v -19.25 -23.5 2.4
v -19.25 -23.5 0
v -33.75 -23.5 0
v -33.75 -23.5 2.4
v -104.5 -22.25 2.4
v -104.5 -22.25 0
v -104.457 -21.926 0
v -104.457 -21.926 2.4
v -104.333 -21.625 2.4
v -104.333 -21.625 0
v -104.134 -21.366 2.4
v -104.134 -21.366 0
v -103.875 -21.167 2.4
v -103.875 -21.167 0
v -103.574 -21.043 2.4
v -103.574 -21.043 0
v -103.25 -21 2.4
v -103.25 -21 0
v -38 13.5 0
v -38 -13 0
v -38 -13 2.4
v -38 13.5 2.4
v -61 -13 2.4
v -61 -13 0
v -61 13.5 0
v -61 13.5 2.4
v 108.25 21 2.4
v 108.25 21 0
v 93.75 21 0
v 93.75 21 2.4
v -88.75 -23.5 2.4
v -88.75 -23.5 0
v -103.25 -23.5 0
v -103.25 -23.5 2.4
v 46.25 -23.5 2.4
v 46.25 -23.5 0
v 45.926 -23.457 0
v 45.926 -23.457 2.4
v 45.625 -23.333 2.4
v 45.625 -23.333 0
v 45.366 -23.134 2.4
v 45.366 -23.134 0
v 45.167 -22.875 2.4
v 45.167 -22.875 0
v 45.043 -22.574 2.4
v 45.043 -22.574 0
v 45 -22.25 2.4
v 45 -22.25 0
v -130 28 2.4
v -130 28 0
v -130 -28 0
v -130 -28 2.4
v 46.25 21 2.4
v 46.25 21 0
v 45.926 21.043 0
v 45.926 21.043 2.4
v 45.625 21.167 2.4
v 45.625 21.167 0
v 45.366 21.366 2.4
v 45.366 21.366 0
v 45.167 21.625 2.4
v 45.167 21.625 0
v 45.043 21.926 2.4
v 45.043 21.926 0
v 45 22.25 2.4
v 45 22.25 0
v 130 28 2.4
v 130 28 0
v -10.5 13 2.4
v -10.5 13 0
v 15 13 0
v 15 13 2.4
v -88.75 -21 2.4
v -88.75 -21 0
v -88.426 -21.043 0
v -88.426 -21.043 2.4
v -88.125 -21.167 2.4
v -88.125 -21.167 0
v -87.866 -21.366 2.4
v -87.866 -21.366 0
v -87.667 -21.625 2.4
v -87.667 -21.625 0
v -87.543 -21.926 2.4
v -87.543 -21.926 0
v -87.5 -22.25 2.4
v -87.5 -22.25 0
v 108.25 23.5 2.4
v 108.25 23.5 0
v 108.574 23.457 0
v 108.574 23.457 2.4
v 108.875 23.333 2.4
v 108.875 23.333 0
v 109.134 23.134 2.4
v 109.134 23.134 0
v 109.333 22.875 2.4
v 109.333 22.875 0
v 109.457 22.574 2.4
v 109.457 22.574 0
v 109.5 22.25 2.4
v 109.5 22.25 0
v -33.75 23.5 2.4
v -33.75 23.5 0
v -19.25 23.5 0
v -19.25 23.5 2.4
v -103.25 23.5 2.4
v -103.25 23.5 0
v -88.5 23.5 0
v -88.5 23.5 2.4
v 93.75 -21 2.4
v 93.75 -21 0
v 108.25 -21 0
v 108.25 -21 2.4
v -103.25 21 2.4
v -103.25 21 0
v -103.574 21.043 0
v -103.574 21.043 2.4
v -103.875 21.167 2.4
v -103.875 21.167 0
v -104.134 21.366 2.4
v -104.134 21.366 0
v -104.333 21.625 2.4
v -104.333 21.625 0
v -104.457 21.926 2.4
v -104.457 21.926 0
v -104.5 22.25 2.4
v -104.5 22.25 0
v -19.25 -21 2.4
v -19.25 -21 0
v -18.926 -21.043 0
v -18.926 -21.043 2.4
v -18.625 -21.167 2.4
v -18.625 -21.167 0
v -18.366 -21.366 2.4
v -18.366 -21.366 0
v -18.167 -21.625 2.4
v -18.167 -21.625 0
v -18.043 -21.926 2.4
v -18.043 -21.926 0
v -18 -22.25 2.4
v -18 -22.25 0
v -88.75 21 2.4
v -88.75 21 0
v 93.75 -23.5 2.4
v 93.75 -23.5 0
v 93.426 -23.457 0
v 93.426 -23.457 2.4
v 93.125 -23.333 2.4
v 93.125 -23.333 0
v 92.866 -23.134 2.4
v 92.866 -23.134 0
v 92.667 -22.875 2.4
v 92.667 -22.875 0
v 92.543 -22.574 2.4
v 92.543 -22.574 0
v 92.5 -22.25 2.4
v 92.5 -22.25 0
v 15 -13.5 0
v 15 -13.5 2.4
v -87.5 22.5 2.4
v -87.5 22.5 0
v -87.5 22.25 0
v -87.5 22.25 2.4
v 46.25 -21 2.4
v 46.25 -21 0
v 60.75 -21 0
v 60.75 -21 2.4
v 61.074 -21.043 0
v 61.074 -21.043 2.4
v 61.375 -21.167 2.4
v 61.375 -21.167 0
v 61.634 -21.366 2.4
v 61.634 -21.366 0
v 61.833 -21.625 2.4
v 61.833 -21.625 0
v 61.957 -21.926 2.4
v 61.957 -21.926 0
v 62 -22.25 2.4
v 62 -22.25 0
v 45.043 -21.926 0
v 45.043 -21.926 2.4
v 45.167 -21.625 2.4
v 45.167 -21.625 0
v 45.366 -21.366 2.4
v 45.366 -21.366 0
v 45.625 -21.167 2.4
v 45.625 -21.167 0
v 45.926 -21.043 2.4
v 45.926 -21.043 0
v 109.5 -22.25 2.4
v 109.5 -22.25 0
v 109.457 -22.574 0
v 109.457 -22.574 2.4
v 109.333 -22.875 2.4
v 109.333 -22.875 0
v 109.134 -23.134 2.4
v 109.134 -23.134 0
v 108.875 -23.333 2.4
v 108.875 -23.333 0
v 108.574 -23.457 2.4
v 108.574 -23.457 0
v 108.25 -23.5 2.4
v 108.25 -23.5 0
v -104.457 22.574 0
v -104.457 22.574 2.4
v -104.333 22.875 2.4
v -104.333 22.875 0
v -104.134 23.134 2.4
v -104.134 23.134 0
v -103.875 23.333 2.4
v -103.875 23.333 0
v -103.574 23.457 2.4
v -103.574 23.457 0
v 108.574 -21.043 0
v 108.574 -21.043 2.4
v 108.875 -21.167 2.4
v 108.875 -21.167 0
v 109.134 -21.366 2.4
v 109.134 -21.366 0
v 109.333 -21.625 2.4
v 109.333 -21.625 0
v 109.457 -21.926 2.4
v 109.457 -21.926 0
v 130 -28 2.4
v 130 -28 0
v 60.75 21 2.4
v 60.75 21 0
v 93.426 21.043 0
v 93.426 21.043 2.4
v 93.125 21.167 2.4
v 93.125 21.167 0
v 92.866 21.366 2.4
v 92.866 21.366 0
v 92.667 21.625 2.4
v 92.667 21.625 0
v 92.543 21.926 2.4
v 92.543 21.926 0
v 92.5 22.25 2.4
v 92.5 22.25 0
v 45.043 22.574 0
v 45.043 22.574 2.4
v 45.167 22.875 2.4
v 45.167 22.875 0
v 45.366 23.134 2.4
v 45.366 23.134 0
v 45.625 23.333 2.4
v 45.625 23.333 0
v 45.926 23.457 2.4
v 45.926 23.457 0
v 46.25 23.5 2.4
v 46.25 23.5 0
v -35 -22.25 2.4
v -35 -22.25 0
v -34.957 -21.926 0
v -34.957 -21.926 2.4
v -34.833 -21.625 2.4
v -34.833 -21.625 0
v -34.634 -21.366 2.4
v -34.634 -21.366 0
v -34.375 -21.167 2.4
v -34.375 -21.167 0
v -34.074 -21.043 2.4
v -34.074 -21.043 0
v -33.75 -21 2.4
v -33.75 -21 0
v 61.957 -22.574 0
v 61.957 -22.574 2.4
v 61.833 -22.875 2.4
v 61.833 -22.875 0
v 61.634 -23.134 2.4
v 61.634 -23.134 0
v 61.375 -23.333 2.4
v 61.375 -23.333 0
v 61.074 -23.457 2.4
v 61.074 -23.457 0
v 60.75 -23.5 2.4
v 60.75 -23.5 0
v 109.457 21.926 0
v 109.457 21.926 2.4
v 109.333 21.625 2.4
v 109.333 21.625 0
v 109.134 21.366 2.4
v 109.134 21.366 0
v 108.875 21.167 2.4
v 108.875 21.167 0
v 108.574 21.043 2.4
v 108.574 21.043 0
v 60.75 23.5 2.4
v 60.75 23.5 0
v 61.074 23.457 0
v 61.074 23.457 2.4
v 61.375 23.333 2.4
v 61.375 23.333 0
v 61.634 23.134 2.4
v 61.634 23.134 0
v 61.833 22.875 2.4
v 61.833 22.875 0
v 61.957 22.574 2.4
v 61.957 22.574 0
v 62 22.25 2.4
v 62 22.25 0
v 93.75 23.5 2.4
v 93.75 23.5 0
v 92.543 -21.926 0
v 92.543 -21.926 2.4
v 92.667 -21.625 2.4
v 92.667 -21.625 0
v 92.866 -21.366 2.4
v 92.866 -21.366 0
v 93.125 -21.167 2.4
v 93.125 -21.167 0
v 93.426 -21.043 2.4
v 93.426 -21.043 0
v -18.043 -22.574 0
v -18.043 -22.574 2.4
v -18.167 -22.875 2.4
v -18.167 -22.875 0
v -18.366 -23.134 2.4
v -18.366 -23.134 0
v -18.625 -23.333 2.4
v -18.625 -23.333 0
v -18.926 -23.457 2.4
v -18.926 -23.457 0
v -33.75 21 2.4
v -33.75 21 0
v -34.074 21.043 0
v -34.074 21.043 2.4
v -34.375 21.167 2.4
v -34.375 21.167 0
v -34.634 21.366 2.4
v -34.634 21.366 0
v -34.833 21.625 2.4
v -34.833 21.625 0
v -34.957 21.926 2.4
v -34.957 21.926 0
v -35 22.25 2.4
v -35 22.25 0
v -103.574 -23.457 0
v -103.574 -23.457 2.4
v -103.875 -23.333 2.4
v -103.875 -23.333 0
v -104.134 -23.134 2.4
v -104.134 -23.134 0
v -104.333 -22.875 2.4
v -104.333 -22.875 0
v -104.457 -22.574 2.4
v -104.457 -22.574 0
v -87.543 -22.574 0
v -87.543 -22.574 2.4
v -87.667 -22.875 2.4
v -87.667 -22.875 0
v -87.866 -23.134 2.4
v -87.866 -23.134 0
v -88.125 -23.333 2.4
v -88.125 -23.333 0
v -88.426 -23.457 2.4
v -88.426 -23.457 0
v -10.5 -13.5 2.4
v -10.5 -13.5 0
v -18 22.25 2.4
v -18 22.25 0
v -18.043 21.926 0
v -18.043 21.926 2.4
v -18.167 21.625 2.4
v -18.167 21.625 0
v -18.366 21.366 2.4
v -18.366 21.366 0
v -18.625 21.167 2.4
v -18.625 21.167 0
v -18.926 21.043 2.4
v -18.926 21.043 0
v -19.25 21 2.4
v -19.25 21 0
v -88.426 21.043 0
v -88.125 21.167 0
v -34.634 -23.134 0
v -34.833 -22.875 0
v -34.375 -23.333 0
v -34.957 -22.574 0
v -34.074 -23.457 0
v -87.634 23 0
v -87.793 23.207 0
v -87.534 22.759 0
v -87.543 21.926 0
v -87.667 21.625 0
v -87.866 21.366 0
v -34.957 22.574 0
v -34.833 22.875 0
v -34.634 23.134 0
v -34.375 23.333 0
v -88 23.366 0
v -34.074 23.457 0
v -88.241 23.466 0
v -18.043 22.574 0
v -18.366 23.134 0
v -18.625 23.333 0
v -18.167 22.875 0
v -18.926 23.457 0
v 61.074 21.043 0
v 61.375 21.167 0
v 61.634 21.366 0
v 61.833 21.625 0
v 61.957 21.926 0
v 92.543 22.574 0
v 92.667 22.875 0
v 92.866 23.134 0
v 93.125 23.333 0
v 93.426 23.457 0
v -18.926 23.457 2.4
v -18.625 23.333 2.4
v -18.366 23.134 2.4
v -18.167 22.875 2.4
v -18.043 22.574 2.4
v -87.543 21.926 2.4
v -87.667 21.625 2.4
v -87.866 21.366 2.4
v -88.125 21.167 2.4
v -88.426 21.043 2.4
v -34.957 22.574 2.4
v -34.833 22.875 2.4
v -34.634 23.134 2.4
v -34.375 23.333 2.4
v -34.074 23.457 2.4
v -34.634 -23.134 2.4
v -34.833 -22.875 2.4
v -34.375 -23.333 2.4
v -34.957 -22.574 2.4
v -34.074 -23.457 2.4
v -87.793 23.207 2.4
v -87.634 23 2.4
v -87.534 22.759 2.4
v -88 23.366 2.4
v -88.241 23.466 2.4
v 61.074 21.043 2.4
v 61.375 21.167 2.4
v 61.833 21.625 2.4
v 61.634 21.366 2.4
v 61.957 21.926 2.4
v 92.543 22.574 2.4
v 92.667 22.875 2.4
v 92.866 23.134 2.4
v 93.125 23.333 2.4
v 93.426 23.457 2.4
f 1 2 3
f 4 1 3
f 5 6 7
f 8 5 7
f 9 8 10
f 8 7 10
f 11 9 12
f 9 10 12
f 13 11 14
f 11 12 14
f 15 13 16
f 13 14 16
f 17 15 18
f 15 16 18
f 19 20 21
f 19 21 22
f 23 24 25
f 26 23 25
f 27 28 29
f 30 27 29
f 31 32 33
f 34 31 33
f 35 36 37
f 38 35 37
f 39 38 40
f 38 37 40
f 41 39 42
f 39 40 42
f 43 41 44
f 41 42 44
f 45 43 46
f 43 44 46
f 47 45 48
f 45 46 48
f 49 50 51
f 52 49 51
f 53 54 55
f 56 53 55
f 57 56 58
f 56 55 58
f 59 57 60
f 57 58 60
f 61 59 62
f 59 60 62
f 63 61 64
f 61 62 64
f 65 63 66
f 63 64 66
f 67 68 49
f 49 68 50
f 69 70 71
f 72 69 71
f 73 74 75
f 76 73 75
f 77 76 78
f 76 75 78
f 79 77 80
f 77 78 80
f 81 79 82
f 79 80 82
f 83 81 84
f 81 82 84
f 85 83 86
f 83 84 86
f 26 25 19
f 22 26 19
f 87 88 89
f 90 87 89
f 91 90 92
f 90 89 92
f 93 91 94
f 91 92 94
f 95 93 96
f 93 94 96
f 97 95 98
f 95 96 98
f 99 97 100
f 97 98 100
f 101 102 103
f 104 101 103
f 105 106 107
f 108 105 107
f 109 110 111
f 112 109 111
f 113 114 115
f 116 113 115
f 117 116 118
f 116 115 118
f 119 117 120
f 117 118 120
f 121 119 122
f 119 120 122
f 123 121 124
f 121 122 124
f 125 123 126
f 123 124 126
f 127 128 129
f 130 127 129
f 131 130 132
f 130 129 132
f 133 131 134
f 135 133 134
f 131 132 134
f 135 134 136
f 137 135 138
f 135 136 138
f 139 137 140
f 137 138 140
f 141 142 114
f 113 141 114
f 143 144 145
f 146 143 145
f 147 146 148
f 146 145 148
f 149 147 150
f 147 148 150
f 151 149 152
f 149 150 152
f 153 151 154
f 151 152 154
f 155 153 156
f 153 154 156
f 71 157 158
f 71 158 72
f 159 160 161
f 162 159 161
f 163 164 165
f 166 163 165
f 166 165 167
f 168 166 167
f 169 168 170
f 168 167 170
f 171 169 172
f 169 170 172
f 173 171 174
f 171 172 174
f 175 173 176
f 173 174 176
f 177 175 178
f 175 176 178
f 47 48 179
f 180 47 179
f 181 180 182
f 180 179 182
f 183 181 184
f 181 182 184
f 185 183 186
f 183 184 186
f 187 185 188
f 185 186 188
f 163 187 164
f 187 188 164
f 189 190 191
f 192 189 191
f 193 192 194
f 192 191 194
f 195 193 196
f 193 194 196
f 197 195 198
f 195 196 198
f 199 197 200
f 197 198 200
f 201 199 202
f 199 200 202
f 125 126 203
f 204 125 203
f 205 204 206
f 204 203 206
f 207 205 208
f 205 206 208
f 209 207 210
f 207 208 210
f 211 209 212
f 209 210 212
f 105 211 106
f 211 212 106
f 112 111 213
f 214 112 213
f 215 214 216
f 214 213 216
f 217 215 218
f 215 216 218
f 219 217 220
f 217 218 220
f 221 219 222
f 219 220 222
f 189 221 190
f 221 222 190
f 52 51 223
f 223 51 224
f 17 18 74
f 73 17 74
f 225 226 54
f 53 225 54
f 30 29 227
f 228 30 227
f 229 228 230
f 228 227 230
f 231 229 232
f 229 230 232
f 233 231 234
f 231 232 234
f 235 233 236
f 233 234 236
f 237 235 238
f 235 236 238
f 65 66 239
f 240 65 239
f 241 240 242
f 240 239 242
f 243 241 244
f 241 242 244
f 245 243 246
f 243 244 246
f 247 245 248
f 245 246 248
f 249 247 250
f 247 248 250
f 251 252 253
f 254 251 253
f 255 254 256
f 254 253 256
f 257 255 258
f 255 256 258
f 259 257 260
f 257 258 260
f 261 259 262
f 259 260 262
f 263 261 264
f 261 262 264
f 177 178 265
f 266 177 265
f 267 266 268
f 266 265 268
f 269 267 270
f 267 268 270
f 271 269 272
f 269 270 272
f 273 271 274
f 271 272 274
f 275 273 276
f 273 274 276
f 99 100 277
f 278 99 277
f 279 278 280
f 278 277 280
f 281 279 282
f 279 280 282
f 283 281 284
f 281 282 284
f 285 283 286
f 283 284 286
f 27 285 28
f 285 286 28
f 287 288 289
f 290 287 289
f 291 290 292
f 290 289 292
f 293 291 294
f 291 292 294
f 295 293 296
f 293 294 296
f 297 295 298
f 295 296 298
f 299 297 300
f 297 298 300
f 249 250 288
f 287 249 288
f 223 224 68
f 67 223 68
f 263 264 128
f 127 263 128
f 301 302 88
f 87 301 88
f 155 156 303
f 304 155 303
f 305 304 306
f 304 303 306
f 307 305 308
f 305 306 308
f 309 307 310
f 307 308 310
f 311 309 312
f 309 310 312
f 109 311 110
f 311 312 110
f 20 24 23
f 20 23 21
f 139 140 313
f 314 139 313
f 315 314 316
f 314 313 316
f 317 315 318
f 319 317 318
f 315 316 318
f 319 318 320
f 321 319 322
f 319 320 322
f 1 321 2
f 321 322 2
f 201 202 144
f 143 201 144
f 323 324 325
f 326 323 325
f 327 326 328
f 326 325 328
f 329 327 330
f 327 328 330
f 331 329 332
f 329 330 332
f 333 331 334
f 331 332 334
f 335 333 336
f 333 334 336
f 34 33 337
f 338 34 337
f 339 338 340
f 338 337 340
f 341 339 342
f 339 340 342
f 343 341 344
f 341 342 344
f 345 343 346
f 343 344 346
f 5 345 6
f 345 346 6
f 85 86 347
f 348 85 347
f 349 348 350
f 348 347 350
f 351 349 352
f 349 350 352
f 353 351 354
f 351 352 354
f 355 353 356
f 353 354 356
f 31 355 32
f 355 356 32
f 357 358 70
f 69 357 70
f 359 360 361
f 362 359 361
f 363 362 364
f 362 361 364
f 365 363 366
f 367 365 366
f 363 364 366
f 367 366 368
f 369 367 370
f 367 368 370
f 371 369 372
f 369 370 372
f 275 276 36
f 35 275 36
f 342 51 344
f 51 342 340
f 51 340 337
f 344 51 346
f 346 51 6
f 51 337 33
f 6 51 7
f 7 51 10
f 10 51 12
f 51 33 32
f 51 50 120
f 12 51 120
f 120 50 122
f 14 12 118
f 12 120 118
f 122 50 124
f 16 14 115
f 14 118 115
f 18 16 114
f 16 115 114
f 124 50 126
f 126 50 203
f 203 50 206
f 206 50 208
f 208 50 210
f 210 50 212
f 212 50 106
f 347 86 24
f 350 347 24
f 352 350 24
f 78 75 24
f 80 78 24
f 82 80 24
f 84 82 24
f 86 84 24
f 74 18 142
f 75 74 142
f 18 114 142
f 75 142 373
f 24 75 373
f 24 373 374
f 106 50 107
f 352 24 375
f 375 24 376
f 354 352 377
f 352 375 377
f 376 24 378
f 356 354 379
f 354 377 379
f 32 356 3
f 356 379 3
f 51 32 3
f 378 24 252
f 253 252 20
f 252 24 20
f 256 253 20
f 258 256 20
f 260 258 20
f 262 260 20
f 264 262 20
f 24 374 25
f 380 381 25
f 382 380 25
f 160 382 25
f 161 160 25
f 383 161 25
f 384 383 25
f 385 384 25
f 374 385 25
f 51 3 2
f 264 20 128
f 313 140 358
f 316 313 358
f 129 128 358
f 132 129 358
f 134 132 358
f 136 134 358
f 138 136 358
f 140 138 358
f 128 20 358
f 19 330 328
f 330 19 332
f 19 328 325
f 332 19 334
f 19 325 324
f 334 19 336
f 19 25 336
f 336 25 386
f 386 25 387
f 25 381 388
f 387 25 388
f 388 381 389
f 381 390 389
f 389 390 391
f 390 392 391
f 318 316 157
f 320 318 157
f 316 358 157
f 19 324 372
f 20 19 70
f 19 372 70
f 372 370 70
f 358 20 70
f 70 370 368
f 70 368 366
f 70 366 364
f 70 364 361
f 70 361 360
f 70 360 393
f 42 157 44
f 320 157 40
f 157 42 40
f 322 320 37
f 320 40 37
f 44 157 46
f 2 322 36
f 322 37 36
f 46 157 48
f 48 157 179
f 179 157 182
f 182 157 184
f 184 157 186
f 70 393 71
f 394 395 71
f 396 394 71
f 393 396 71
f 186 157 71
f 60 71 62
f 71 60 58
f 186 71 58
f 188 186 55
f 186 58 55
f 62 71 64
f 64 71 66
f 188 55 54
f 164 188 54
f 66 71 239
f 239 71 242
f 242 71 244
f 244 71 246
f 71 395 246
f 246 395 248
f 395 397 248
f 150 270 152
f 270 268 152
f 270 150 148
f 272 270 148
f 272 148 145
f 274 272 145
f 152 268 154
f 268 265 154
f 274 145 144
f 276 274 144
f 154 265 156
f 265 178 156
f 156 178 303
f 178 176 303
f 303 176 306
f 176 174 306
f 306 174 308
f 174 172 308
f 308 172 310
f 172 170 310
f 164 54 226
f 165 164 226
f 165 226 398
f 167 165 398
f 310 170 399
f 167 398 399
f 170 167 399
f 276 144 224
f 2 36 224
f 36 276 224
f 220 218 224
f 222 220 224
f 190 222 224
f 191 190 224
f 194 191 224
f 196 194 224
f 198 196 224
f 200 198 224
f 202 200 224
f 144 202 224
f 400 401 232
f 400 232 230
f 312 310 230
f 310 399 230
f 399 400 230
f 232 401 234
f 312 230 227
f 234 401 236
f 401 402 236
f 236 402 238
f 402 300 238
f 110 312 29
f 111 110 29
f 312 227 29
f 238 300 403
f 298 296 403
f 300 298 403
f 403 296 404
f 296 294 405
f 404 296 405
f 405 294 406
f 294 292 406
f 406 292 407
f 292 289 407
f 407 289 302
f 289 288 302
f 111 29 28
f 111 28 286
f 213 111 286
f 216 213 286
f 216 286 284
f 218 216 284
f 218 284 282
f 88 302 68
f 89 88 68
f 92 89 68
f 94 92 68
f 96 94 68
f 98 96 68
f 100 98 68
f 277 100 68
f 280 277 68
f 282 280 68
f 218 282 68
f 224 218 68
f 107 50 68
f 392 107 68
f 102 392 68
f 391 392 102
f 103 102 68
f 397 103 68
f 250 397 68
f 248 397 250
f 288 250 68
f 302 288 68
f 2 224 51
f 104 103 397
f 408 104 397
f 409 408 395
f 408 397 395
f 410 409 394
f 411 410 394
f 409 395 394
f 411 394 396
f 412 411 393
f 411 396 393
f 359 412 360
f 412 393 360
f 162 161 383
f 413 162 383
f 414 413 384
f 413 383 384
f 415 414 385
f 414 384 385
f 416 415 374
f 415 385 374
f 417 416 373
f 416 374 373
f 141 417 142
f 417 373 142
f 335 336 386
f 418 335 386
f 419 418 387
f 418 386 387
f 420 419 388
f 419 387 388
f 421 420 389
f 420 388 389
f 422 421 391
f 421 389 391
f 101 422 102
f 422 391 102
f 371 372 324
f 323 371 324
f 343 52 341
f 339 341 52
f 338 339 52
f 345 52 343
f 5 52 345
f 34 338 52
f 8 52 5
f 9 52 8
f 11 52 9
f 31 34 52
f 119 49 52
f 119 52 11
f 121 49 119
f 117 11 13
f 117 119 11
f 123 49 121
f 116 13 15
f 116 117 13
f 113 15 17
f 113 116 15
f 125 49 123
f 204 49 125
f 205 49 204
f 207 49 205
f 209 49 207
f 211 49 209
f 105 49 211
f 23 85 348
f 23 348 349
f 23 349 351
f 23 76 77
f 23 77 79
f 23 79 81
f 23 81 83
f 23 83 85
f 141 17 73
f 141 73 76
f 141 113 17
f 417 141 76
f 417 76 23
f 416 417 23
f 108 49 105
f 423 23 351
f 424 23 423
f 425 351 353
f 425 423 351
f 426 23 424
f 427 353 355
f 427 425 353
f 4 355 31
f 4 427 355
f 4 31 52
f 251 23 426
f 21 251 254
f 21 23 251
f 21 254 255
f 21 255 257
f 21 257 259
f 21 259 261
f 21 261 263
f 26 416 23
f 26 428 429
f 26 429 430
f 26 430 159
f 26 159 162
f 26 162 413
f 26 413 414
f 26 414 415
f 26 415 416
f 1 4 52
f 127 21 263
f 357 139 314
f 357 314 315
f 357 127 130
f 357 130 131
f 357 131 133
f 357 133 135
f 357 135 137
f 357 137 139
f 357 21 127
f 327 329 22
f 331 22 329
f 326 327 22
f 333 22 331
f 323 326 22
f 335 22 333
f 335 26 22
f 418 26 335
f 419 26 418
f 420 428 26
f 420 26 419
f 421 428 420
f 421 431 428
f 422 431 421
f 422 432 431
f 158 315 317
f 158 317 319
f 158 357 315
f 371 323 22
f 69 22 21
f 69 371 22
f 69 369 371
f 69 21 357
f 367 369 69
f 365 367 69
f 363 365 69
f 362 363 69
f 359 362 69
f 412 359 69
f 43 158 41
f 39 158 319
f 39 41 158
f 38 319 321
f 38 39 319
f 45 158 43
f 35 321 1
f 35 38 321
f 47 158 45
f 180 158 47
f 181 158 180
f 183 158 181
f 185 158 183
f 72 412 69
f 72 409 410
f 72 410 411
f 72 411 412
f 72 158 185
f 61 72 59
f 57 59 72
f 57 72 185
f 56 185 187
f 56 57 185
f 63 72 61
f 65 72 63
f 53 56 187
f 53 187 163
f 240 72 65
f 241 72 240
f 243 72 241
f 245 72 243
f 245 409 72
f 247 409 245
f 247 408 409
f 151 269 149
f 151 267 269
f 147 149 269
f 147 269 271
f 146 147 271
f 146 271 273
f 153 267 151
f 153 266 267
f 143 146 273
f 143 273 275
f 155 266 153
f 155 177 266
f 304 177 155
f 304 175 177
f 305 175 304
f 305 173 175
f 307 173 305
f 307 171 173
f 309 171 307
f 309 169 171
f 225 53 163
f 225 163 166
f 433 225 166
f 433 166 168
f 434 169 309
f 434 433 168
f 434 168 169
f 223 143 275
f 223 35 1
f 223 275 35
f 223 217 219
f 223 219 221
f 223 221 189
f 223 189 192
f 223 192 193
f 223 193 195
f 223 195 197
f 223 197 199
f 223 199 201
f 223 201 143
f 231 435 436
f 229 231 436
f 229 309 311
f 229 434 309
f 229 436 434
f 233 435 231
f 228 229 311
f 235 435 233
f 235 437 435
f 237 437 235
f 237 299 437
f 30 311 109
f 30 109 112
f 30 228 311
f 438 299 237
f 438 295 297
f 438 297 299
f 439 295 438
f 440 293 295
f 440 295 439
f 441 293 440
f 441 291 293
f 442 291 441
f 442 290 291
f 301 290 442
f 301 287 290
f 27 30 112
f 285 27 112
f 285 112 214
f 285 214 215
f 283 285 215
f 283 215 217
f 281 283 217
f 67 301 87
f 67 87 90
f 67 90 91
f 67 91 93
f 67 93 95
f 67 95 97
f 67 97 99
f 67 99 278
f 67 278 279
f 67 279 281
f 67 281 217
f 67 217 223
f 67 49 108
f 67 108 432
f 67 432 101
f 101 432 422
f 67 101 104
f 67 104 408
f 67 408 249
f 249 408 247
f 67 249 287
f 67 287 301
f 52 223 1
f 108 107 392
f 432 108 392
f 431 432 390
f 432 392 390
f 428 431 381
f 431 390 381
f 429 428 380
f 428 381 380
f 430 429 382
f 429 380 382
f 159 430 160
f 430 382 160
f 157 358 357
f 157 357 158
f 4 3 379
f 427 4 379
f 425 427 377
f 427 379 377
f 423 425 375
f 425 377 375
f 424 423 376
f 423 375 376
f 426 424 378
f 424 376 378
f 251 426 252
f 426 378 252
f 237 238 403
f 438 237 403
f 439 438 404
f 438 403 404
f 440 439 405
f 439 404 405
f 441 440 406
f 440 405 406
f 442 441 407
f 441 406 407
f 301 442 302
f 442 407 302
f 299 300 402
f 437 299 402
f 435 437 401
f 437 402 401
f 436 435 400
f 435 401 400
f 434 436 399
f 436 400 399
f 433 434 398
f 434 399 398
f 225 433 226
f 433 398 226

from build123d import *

# Parameters (mm, degrees)
F0_W     = 25.5
F0_H     = 26.5
F0_W_2   = 23
F1_DEPTH = 2.4


with BuildPart() as f1:
    # F0 (on Top) → F1 (new body)
    with BuildSketch(Plane.XY):
        Polygon((109.5, -28), (130, -28), (130, 28), (109.5, 28), (-35, 28), (-61, 28), (-104.5, 28), (-130, 28), (-130, -28), (-104.5, -28), (-35, -28), (-10.5, -28), (62, -28), align=None)
        with BuildLine():
            Line((-88.75, -23.5), (-103.25, -23.5))
            ThreePointArc((-103.25, -23.5), (-104.133883, -23.133883), (-104.5, -22.25))
            ThreePointArc((-104.5, -22.25), (-104.133883, -21.366117), (-103.25, -21))
            Line((-103.25, -21), (-88.75, -21))
            ThreePointArc((-88.75, -21), (-87.866117, -21.366117), (-87.5, -22.25))
            ThreePointArc((-87.5, -22.25), (-87.866117, -23.133883), (-88.75, -23.5))
        make_face(mode=Mode.SUBTRACT)
        with BuildLine():
            Line((-19.25, -23.5), (-33.75, -23.5))
            ThreePointArc((-33.75, -23.5), (-34.633883, -23.133883), (-35, -22.25))
            ThreePointArc((-35, -22.25), (-34.633883, -21.366117), (-33.75, -21))
            Line((-33.75, -21), (-19.25, -21))
            ThreePointArc((-19.25, -21), (-18.366117, -21.366117), (-18, -22.25))
            ThreePointArc((-18, -22.25), (-18.366117, -23.133883), (-19.25, -23.5))
        make_face(mode=Mode.SUBTRACT)
        with BuildLine():
            ThreePointArc((62, -22.25), (61.633883, -23.133883), (60.75, -23.5))
            Line((60.75, -23.5), (46.25, -23.5))
            ThreePointArc((46.25, -23.5), (45.366117, -23.133883), (45, -22.25))
            ThreePointArc((45, -22.25), (45.366117, -21.366117), (46.25, -21))
            Line((46.25, -21), (60.75, -21))
            ThreePointArc((60.75, -21), (61.633883, -21.366117), (62, -22.25))
        make_face(mode=Mode.SUBTRACT)
        with BuildLine():
            ThreePointArc((109.5, -22.25), (109.133883, -23.133883), (108.25, -23.5))
            Line((108.25, -23.5), (93.75, -23.5))
            ThreePointArc((93.75, -23.5), (92.866117, -23.133883), (92.5, -22.25))
            ThreePointArc((92.5, -22.25), (92.866117, -21.366117), (93.75, -21))
            Line((93.75, -21), (108.25, -21))
            ThreePointArc((108.25, -21), (109.133883, -21.366117), (109.5, -22.25))
        make_face(mode=Mode.SUBTRACT)
        with Locations((2.25, -0.25)):
            Rectangle(F0_W, F0_H, mode=Mode.SUBTRACT)
        with Locations((-49.5, 0.25)):
            Rectangle(F0_W_2, F0_H, mode=Mode.SUBTRACT)
        with BuildLine():
            ThreePointArc((-104.5, 22.25), (-104.133883, 23.133883), (-103.25, 23.5))
            Line((-103.25, 23.5), (-88.5, 23.5))
            ThreePointArc((-88.5, 23.5), (-87.792893, 23.207107), (-87.5, 22.5))
            Line((-87.5, 22.5), (-87.5, 22.25))
            ThreePointArc((-87.5, 22.25), (-87.866117, 21.366117), (-88.75, 21))
            Line((-88.75, 21), (-103.25, 21))
            ThreePointArc((-103.25, 21), (-104.133883, 21.366117), (-104.5, 22.25))
        make_face(mode=Mode.SUBTRACT)
        with BuildLine():
            ThreePointArc((-35, 22.25), (-34.633883, 23.133883), (-33.75, 23.5))
            Line((-33.75, 23.5), (-19.25, 23.5))
            ThreePointArc((-19.25, 23.5), (-18.366117, 23.133883), (-18, 22.25))
            ThreePointArc((-18, 22.25), (-18.366117, 21.366117), (-19.25, 21))
            Line((-19.25, 21), (-33.75, 21))
            ThreePointArc((-33.75, 21), (-34.633883, 21.366117), (-35, 22.25))
        make_face(mode=Mode.SUBTRACT)
        with BuildLine():
            Line((46.25, 23.5), (60.75, 23.5))
            ThreePointArc((60.75, 23.5), (61.633883, 23.133883), (62, 22.25))
            ThreePointArc((62, 22.25), (61.633883, 21.366117), (60.75, 21))
            Line((60.75, 21), (46.25, 21))
            ThreePointArc((46.25, 21), (45.366117, 21.366117), (45, 22.25))
            ThreePointArc((45, 22.25), (45.366117, 23.133883), (46.25, 23.5))
        make_face(mode=Mode.SUBTRACT)
        with BuildLine():
            Line((93.75, 23.5), (108.25, 23.5))
            ThreePointArc((108.25, 23.5), (109.133883, 23.133883), (109.5, 22.25))
            ThreePointArc((109.5, 22.25), (109.133883, 21.366117), (108.25, 21))
            Line((108.25, 21), (93.75, 21))
            ThreePointArc((93.75, 21), (92.866117, 21.366117), (92.5, 22.25))
            ThreePointArc((92.5, 22.25), (92.866117, 23.133883), (93.75, 23.5))
        make_face(mode=Mode.SUBTRACT)
    extrude(amount=F1_DEPTH)


solid = f1.part
